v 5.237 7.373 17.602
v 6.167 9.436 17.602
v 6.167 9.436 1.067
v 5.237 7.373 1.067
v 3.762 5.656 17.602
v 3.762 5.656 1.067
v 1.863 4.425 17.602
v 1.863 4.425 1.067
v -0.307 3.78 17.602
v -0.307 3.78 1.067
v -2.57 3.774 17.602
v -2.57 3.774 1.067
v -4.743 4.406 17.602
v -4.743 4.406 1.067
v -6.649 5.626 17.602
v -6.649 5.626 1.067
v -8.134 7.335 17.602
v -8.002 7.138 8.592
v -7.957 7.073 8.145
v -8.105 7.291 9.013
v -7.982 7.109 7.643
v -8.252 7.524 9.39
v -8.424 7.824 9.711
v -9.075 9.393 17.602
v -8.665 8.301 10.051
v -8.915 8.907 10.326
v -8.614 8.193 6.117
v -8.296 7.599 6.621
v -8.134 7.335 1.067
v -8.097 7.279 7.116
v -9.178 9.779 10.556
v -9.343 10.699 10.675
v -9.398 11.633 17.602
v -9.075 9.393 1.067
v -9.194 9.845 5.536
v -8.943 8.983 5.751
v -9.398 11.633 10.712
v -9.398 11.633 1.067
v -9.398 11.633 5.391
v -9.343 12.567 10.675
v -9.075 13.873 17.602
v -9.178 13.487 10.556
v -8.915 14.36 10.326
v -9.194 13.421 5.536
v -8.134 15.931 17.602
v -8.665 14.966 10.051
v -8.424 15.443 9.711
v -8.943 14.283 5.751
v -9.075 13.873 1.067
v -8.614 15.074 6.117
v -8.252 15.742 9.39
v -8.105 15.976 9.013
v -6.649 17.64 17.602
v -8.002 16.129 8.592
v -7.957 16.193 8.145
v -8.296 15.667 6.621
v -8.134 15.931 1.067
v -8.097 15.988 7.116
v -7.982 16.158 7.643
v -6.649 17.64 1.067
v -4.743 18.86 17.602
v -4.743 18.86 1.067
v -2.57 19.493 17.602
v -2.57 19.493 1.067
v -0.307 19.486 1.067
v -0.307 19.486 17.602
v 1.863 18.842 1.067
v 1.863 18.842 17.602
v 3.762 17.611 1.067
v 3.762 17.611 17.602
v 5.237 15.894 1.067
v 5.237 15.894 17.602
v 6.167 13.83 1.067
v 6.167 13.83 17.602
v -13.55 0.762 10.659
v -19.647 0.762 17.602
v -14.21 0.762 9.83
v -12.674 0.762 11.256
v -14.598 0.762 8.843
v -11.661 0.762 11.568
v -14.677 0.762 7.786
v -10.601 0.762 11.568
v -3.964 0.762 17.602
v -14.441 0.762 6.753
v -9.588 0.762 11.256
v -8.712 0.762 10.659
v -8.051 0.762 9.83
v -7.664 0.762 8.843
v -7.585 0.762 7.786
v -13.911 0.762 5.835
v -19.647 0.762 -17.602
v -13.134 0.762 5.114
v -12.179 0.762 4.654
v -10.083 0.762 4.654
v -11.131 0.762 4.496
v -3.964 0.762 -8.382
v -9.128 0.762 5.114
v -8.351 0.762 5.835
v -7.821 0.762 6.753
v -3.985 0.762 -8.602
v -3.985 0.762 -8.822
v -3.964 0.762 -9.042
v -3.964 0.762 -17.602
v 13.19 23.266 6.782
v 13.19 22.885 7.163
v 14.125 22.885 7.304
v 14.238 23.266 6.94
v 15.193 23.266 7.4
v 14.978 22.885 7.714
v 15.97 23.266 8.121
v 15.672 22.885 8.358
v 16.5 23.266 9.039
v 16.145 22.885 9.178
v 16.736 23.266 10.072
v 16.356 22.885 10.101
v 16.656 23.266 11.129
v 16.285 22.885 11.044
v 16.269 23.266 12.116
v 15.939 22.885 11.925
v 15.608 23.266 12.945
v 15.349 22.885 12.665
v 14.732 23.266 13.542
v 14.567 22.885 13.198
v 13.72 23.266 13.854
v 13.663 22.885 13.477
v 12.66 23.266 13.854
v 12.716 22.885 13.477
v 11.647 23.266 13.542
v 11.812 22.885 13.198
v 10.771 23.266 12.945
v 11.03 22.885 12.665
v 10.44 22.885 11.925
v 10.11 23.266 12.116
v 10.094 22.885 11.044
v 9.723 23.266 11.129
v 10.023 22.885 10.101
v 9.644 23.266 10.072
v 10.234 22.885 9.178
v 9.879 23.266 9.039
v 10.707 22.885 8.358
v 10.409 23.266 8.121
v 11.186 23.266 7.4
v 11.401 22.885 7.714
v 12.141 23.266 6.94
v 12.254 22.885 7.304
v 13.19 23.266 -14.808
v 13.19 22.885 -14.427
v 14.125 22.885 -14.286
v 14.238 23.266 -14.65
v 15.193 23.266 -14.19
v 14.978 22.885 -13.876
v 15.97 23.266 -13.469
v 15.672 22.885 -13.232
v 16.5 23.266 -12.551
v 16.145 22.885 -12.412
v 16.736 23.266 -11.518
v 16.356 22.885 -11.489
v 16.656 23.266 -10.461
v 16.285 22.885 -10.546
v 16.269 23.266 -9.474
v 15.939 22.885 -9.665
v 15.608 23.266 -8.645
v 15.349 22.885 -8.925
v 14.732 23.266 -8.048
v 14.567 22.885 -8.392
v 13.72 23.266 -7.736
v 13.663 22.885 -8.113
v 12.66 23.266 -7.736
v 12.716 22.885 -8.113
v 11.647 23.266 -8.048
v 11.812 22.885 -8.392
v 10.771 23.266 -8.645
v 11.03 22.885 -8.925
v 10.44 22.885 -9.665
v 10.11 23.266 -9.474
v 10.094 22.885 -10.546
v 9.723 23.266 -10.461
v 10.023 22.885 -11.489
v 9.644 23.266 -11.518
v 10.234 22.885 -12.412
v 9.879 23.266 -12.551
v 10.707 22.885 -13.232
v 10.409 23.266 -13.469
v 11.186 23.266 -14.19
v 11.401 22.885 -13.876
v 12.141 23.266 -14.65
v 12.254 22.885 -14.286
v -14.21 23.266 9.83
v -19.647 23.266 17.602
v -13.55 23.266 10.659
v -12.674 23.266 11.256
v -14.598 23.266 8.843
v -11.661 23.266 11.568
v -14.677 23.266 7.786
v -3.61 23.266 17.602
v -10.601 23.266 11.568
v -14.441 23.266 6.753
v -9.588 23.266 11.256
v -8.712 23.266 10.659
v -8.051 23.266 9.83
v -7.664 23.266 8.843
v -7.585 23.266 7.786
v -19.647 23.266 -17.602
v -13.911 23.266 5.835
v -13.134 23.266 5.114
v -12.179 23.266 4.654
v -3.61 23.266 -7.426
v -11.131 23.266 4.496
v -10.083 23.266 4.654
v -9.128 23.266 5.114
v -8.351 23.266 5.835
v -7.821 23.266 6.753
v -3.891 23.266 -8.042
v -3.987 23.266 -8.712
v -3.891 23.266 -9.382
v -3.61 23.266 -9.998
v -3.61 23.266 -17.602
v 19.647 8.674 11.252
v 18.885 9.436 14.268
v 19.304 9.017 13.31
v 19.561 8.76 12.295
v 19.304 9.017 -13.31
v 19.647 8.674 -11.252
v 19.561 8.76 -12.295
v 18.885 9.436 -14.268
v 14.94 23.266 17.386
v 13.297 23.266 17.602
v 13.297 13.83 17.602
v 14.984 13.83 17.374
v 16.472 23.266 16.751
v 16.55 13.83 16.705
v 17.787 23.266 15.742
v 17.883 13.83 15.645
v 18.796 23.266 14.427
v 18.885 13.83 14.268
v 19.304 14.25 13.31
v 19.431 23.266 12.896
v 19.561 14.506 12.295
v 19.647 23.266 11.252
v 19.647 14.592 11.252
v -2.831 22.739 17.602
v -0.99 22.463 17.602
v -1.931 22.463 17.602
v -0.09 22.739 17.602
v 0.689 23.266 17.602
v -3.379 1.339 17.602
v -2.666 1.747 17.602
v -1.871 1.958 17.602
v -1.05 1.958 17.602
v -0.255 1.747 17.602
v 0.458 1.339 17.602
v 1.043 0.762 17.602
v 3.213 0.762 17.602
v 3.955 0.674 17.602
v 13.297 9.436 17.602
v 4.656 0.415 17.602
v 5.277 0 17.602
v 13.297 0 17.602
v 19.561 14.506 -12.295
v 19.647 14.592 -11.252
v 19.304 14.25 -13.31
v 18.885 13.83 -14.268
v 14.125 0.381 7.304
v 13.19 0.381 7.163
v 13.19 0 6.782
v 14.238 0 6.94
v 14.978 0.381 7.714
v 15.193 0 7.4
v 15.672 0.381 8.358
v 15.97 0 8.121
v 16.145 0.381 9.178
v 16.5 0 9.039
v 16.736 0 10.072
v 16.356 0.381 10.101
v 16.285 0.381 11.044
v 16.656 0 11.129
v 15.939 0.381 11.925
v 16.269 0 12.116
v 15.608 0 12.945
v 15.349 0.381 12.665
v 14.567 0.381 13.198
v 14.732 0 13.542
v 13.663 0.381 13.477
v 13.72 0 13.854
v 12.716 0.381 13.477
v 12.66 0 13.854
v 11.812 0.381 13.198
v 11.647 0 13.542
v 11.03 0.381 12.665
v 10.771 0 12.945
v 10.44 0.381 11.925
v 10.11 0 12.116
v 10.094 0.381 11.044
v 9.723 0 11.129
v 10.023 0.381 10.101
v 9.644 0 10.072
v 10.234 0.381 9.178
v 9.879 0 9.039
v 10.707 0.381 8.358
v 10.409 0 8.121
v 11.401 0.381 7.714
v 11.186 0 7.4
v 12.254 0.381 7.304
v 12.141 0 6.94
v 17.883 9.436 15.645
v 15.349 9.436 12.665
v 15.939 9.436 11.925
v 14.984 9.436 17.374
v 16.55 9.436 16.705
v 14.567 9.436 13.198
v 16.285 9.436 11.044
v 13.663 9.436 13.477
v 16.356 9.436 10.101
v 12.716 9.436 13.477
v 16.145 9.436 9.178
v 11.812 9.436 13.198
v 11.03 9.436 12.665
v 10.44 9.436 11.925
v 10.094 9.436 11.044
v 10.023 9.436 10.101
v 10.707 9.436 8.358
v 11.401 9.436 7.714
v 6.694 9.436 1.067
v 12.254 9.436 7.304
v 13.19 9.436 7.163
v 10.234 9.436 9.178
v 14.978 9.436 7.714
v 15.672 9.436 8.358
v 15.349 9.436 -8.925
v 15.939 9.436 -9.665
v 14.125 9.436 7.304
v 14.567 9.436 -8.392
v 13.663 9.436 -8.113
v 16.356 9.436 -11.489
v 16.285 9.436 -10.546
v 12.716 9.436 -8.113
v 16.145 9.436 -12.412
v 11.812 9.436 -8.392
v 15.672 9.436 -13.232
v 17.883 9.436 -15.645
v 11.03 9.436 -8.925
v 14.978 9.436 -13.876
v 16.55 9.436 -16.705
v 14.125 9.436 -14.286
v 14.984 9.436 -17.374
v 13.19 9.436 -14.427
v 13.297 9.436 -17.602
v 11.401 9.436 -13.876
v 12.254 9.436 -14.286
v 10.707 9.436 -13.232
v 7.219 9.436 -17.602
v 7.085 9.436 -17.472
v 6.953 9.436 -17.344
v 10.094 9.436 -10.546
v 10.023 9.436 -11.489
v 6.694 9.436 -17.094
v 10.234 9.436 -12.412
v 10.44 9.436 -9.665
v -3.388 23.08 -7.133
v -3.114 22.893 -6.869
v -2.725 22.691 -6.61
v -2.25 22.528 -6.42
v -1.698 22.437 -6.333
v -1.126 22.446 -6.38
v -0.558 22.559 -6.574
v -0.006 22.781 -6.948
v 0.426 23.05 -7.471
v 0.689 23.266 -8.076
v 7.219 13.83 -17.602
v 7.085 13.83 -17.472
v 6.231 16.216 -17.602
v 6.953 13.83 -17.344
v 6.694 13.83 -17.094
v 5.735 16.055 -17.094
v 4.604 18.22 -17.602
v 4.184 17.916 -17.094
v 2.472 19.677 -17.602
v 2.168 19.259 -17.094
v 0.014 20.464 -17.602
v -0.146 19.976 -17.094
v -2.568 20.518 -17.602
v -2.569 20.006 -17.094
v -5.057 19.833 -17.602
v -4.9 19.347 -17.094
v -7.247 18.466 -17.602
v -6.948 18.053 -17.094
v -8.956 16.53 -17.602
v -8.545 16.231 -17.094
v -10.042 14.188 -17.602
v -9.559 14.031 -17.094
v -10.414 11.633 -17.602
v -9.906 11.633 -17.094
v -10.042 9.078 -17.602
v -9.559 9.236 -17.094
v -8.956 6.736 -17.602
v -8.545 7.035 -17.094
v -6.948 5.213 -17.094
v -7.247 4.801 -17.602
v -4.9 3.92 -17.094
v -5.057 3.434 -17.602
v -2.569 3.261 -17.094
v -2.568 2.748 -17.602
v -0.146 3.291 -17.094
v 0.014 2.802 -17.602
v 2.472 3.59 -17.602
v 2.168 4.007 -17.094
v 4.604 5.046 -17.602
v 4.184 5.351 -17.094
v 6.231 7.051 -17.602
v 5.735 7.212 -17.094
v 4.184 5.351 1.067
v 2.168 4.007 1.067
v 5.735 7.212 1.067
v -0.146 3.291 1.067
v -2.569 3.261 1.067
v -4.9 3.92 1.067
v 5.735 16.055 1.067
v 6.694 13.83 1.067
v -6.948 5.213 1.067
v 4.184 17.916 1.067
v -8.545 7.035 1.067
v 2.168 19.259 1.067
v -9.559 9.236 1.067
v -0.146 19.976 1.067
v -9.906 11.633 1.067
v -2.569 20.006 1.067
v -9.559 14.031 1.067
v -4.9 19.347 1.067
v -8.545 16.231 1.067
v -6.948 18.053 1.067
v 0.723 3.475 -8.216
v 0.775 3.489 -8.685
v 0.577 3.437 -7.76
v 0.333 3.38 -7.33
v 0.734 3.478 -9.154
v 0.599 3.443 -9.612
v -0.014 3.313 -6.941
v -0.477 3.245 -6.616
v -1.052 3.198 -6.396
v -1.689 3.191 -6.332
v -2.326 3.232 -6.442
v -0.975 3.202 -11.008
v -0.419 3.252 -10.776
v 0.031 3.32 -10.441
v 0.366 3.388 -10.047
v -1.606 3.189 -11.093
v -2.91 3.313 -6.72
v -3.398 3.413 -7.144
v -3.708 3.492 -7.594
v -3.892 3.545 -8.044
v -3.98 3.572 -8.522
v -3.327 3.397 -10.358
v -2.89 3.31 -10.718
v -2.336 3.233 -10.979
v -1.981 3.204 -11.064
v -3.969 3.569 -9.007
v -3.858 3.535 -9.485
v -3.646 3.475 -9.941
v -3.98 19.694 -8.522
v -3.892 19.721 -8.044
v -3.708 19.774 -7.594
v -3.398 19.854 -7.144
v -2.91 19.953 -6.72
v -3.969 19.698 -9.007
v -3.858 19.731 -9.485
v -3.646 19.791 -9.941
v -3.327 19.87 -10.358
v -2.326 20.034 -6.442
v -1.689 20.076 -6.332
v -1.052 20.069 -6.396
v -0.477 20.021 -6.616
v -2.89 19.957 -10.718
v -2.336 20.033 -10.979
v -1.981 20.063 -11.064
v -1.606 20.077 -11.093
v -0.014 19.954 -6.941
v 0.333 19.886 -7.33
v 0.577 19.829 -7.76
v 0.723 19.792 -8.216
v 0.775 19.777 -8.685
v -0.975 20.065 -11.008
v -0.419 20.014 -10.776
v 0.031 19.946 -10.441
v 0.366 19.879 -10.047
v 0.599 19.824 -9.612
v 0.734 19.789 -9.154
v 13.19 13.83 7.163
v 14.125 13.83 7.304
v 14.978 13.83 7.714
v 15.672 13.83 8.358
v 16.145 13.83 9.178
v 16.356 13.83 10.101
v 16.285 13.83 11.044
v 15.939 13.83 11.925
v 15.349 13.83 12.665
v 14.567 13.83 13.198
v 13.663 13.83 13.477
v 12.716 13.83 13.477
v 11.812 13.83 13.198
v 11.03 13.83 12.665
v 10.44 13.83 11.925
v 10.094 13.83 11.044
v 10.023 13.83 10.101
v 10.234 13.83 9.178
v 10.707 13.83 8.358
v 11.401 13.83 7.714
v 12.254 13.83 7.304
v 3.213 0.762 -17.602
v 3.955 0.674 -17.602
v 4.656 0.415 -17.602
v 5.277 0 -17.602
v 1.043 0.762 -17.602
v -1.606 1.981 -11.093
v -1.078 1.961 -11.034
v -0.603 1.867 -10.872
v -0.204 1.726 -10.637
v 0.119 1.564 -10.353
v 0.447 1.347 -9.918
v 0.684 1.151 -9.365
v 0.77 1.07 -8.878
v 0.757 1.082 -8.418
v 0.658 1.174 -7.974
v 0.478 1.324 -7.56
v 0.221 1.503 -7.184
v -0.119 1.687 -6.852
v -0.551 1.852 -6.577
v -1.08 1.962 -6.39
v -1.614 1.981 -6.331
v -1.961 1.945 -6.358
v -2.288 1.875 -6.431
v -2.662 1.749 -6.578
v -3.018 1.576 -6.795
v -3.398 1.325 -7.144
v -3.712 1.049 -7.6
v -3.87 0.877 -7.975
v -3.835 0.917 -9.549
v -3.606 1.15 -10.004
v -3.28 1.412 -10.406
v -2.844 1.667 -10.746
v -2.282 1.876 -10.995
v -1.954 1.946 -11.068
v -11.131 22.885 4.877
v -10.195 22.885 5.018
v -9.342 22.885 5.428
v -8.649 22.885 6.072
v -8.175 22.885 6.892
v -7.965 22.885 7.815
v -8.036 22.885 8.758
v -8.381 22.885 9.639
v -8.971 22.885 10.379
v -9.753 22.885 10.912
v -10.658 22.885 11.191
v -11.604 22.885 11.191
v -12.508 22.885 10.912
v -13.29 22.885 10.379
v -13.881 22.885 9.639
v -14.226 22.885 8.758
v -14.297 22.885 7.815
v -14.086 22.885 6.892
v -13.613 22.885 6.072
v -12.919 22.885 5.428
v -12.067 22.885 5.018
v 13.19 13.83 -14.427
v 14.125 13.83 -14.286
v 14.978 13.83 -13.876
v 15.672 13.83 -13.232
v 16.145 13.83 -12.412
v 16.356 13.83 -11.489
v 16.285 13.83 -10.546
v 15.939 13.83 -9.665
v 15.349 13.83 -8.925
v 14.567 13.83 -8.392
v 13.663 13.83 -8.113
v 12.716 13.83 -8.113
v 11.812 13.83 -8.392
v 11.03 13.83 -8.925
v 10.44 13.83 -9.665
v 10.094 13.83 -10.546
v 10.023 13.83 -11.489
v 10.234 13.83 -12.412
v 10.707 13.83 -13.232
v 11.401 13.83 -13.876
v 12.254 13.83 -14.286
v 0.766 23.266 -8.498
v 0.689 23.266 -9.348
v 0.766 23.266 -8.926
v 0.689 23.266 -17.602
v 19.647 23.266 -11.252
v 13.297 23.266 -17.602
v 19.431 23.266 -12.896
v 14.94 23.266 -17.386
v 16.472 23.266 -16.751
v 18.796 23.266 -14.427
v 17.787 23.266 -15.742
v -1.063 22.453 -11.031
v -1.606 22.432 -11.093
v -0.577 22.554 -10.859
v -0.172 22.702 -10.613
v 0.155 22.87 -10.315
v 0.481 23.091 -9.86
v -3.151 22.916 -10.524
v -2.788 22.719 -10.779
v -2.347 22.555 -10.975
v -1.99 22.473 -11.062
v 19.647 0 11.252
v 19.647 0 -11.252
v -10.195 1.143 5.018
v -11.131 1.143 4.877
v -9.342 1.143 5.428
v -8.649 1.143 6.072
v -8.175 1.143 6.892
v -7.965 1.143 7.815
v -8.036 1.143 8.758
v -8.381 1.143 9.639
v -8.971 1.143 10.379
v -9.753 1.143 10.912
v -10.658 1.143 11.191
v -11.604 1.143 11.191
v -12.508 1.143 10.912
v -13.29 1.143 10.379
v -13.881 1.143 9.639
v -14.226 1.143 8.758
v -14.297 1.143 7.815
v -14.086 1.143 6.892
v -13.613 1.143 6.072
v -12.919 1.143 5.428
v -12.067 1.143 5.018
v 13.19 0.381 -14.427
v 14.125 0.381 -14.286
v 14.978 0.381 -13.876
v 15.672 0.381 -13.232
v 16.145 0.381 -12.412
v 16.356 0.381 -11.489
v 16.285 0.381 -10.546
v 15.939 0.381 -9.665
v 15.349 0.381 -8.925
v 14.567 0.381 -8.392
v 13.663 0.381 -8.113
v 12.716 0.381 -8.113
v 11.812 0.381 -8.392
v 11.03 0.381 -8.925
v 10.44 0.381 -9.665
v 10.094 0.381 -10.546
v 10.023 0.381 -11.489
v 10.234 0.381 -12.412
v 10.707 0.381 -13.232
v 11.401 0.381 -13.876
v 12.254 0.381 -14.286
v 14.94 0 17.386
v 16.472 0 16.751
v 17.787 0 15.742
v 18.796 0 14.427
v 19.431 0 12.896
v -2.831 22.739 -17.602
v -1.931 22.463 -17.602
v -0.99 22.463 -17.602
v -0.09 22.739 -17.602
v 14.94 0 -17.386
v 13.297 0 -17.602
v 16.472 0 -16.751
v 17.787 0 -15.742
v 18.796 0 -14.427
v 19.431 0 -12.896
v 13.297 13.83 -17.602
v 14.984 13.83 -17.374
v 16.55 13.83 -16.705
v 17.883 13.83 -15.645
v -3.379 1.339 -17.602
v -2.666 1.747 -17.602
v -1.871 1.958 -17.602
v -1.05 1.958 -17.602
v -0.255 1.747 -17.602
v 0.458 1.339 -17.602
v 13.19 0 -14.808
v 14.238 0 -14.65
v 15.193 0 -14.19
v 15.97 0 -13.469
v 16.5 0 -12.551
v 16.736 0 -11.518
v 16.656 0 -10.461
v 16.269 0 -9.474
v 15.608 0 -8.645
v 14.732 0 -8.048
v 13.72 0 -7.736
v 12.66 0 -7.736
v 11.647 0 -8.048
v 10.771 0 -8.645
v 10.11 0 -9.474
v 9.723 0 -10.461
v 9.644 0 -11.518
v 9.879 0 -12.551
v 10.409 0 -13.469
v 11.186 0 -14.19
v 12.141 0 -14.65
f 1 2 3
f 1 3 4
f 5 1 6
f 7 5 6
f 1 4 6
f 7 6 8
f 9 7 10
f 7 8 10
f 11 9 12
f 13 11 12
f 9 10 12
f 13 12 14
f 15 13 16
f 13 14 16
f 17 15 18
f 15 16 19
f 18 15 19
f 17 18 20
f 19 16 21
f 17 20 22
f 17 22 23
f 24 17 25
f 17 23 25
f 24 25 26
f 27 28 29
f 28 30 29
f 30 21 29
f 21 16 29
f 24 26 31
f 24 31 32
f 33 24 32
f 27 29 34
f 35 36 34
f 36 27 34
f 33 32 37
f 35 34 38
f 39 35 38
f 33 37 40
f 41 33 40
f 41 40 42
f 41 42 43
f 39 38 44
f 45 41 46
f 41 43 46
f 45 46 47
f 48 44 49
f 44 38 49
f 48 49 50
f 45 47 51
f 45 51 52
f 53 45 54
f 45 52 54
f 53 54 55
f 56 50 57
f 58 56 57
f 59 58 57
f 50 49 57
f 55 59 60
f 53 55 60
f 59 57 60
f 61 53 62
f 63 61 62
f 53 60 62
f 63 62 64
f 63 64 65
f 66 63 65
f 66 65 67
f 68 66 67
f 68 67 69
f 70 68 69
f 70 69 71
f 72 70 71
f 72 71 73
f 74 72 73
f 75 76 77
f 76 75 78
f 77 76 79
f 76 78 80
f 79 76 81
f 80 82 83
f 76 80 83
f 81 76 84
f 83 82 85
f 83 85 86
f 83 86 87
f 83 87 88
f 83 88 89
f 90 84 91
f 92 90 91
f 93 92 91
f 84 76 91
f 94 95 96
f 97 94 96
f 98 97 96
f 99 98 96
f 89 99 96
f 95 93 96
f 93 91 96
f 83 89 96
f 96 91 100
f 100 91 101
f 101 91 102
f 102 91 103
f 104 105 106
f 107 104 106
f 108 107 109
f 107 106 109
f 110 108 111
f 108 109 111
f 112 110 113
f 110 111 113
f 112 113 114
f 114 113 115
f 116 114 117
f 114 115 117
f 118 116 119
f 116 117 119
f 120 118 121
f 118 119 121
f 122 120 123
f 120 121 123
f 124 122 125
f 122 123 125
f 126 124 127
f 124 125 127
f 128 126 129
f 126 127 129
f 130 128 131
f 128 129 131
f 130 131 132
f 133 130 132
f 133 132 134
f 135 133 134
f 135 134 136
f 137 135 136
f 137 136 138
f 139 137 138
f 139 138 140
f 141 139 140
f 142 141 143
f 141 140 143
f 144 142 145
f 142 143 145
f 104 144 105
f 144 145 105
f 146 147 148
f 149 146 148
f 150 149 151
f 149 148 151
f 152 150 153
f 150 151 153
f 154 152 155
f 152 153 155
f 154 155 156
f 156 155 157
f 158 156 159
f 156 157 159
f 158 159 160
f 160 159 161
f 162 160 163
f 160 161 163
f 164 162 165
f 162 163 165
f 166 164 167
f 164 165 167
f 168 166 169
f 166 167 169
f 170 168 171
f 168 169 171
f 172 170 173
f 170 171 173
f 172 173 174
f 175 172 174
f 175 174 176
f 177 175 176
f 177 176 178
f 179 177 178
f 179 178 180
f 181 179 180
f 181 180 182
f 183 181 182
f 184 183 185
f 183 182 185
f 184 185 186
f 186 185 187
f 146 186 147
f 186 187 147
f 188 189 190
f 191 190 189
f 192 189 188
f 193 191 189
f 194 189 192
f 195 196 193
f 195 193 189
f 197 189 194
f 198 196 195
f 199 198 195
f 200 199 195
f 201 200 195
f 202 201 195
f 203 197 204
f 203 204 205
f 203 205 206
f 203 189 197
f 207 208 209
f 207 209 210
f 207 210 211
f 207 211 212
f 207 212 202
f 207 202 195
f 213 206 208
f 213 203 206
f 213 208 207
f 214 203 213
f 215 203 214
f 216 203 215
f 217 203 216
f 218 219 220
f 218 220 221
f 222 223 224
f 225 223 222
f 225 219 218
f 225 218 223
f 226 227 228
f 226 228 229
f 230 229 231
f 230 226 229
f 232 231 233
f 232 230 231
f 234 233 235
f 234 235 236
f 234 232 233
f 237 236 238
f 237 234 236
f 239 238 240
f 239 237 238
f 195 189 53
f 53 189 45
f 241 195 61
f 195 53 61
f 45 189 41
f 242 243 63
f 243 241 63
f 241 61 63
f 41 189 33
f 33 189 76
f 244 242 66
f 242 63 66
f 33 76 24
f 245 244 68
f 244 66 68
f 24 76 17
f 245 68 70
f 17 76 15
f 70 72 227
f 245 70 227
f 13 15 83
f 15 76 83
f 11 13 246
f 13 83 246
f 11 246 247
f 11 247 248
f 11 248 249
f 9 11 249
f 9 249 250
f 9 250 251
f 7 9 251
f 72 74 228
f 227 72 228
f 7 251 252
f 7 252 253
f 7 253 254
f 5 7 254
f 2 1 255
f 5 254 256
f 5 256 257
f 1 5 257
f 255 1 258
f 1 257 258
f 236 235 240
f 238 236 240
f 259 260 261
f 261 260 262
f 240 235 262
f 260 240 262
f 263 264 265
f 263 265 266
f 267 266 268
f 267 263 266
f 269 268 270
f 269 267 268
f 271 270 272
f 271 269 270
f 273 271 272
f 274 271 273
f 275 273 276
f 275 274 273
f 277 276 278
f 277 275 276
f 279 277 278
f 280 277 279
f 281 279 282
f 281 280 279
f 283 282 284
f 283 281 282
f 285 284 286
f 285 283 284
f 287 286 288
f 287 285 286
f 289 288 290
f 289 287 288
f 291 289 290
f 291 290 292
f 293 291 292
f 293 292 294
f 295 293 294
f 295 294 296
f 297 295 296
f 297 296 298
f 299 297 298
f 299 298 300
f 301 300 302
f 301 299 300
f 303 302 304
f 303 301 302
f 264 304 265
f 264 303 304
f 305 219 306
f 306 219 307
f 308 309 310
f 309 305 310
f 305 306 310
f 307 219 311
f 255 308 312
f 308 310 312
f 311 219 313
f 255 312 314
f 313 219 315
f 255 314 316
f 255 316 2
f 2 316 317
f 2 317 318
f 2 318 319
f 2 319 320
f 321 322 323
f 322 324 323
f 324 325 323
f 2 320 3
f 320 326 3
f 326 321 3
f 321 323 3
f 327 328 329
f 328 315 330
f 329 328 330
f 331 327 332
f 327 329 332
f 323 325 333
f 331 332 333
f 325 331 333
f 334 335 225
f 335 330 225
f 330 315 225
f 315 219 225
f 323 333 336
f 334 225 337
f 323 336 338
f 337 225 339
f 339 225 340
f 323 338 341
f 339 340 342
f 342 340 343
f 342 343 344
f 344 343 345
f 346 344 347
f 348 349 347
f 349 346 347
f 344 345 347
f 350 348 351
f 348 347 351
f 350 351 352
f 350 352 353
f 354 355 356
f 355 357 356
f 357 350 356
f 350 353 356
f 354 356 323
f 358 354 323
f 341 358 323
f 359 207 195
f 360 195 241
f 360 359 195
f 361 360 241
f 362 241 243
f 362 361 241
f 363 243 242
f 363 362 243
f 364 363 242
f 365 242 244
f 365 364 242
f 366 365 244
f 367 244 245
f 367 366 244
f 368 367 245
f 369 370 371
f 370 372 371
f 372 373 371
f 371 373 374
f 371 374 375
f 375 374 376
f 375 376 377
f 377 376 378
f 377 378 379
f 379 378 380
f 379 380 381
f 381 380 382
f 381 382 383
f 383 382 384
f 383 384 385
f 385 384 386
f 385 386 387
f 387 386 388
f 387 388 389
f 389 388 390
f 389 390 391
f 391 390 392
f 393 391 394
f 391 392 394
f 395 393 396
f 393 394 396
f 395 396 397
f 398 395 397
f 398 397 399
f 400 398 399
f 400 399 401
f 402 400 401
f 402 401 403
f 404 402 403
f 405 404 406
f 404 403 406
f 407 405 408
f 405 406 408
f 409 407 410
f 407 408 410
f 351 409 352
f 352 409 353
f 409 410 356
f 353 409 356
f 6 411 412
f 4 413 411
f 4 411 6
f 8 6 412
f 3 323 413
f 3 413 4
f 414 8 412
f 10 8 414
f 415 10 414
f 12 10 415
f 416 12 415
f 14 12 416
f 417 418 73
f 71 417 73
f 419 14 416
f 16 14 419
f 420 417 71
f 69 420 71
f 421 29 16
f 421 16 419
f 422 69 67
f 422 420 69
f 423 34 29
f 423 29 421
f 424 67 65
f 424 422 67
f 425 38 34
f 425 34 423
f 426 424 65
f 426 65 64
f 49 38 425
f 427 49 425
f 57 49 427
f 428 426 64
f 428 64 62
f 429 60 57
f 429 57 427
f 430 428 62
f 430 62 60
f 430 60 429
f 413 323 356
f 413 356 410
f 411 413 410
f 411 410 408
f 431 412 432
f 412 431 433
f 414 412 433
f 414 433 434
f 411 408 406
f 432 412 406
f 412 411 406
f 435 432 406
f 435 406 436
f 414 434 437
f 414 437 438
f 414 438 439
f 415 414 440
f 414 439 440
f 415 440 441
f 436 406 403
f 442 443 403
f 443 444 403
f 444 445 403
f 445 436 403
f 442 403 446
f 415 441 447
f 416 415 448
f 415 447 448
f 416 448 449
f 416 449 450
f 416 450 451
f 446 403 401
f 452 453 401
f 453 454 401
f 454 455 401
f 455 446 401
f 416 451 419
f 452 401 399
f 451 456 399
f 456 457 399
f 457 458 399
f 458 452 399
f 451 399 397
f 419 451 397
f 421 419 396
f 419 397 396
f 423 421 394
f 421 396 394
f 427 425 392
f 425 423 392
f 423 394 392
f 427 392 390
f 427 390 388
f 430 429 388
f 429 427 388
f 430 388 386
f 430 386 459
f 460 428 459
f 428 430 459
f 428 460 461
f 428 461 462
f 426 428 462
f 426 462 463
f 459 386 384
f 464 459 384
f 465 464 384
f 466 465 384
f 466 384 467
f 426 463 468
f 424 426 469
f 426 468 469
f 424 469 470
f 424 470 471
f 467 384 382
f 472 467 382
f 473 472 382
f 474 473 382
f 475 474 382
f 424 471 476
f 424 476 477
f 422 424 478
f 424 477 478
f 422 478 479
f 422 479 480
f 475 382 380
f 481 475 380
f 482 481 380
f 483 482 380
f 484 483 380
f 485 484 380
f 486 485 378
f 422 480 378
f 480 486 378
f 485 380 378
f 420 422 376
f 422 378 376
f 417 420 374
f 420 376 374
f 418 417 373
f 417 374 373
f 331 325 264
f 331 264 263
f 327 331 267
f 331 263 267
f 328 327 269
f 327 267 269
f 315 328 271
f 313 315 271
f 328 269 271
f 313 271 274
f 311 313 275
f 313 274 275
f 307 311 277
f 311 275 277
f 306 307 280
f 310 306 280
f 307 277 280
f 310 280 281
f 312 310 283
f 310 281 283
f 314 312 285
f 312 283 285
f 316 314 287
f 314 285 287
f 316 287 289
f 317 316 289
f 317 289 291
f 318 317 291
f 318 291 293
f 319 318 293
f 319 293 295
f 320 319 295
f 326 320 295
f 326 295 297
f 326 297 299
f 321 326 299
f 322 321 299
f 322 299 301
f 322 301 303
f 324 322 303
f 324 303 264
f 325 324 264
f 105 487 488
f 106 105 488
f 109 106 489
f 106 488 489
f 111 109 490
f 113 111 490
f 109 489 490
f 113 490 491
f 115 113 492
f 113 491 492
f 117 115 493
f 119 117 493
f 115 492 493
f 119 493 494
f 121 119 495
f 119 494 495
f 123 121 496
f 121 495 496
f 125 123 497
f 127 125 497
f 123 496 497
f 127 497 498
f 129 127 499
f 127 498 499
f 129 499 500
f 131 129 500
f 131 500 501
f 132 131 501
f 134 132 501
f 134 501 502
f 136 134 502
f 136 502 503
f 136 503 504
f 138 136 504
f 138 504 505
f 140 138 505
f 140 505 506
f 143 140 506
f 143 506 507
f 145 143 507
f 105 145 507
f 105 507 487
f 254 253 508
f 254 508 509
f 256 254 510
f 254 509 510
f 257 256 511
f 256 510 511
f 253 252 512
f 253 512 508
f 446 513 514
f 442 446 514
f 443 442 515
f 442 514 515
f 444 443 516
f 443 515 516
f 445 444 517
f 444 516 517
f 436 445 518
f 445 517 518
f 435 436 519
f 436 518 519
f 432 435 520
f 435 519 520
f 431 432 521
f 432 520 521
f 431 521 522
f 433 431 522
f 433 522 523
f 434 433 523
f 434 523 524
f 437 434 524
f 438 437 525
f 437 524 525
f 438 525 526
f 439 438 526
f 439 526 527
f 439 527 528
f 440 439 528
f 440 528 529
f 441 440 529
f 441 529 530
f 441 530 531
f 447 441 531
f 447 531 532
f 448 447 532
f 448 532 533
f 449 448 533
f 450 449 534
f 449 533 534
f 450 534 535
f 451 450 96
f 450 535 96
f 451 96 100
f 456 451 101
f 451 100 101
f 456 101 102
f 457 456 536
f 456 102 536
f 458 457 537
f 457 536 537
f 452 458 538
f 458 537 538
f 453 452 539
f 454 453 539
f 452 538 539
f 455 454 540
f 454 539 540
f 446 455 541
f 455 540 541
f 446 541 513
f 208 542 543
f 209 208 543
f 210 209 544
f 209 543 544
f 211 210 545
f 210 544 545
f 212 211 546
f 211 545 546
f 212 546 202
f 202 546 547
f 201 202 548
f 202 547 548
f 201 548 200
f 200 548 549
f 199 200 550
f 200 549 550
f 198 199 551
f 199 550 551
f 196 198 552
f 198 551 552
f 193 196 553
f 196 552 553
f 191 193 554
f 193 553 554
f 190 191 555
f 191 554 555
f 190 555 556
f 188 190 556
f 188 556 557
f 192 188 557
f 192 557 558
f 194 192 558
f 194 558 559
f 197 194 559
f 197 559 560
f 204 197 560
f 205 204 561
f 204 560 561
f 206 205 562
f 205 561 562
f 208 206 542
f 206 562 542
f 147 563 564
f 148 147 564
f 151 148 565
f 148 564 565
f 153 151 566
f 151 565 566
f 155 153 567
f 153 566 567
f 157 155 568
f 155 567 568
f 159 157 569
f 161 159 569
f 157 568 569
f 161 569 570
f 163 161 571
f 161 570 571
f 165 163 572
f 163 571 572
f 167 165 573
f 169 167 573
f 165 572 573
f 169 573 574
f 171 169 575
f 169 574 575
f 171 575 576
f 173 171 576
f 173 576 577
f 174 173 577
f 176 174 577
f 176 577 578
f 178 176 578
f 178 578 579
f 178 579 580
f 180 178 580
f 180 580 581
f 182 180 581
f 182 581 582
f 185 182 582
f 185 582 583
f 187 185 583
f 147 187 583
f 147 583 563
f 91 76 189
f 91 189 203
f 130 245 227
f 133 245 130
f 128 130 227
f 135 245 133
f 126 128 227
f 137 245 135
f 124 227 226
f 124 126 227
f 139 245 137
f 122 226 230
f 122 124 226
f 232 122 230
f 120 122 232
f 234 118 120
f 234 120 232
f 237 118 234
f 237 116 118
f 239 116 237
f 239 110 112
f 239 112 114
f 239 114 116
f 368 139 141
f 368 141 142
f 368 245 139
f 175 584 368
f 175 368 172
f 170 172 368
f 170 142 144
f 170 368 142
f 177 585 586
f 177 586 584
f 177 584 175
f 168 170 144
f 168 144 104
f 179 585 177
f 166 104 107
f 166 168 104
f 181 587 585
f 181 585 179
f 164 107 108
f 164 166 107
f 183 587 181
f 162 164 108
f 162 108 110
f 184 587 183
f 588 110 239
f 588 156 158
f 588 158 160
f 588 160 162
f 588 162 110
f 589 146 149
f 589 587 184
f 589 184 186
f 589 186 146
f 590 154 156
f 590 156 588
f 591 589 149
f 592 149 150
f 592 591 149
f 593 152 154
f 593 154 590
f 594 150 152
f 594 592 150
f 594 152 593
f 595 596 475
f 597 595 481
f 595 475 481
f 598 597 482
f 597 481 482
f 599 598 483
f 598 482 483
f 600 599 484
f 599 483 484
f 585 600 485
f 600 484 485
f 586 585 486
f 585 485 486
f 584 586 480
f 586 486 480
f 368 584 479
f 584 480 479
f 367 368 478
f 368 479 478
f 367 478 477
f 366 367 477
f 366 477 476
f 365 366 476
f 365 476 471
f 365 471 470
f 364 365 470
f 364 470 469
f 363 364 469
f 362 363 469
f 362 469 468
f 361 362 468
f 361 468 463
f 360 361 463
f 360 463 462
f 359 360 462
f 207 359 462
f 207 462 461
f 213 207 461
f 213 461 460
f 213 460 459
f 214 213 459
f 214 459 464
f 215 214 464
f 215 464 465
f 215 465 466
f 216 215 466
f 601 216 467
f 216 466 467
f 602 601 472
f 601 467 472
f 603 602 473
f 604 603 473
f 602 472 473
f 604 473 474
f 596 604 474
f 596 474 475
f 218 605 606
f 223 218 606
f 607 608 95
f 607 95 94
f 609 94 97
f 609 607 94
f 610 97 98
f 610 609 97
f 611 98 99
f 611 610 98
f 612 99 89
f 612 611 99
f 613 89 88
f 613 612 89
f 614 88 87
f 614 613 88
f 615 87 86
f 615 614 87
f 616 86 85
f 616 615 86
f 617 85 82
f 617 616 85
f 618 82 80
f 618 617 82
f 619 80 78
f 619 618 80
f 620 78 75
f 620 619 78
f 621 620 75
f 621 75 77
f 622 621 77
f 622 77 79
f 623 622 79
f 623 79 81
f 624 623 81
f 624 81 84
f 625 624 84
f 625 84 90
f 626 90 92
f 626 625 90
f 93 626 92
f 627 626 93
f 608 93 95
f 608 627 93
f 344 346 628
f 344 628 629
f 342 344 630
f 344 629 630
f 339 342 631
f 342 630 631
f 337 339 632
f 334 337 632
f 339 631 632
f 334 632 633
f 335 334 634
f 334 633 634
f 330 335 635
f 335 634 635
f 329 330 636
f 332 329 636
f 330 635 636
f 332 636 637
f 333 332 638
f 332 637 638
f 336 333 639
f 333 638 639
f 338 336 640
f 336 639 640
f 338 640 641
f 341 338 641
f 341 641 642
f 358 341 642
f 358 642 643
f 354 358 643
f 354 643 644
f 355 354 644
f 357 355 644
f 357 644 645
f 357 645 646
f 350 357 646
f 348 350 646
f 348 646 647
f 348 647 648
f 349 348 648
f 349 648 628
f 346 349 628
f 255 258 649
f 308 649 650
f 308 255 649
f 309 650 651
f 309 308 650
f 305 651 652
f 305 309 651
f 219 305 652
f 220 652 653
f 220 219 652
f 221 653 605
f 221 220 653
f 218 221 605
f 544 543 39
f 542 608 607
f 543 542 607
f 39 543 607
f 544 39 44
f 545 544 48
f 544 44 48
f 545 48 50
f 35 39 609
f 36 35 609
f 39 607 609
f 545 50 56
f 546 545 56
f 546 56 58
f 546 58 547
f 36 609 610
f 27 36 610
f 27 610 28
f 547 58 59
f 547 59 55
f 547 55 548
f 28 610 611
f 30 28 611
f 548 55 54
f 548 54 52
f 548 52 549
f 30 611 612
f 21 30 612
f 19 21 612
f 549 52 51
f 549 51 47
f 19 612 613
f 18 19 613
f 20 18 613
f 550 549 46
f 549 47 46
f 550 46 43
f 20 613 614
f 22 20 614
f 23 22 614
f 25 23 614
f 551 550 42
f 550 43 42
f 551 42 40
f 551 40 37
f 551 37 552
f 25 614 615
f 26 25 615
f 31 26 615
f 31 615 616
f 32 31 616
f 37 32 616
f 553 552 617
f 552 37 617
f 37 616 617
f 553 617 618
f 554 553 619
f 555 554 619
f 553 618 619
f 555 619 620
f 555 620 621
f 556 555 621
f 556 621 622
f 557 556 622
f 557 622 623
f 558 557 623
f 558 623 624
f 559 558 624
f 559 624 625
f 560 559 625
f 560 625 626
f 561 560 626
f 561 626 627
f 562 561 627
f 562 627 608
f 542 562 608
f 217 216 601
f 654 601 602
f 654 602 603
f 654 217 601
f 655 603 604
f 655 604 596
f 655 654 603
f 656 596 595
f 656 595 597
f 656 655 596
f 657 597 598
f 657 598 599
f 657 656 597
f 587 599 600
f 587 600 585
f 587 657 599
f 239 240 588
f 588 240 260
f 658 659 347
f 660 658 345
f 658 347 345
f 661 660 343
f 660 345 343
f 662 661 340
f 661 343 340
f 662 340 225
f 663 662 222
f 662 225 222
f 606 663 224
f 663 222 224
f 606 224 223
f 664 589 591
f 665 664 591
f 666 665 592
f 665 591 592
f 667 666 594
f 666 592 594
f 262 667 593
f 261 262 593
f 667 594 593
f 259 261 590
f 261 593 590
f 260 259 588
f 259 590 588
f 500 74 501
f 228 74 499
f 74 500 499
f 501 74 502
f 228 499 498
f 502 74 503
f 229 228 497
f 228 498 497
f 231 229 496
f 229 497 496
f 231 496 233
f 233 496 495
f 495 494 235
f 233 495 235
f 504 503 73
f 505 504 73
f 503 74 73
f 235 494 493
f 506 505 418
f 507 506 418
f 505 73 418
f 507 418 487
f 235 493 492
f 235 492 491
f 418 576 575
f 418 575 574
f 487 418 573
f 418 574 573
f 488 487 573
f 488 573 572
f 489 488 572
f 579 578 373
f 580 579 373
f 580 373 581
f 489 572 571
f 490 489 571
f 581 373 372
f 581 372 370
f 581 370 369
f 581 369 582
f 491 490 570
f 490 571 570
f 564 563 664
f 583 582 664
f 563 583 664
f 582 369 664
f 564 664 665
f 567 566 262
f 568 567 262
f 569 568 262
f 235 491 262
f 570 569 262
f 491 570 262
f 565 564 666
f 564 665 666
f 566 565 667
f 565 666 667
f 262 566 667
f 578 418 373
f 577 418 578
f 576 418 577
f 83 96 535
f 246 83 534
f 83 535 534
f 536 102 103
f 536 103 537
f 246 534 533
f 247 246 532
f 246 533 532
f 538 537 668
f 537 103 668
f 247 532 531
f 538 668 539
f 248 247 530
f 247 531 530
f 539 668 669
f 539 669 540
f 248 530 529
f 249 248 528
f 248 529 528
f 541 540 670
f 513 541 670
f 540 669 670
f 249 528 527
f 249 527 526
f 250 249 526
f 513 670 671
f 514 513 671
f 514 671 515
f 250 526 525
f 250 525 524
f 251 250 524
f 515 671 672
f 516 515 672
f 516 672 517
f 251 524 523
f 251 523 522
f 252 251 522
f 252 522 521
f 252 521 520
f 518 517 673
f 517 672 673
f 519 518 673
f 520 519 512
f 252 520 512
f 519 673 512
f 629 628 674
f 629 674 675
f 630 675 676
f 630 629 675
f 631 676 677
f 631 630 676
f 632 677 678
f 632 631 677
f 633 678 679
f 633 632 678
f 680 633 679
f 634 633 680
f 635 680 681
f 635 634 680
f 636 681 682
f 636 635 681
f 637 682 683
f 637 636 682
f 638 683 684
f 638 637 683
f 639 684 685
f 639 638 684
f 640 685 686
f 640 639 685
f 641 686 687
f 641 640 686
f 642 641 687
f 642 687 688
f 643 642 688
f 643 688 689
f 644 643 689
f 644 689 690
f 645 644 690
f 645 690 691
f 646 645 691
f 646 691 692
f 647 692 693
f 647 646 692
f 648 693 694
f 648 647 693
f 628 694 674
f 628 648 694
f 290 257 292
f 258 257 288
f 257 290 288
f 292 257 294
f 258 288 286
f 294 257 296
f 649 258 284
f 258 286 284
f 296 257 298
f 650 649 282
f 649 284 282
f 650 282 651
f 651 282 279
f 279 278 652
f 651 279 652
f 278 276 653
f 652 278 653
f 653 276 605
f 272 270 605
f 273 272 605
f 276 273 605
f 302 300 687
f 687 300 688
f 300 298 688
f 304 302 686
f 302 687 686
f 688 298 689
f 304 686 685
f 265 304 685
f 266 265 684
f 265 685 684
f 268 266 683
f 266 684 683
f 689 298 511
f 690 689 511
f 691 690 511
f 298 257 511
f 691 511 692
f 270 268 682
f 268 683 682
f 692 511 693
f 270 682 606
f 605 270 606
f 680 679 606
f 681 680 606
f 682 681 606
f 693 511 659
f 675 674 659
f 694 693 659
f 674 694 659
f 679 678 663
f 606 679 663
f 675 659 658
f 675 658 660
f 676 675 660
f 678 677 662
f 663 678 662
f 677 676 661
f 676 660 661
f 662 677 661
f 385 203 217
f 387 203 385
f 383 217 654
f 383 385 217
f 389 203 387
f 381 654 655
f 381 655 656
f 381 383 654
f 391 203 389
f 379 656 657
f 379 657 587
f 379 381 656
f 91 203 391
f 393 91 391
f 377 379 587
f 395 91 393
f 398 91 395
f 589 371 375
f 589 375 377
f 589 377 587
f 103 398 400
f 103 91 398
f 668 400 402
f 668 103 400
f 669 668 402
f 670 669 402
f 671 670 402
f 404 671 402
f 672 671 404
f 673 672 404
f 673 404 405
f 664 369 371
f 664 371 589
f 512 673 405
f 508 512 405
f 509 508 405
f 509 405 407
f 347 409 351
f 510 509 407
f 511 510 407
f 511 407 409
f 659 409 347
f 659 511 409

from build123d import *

# Parameters (mm, degrees)
SKETCH1_W               = 39.2938
SKETCH1_H               = 35.2044
BOSS_EXTRUDE1_DEPTH     = 23.2664
CUT_EXTRUDE1_DEPTH      = 47.54756522
SKETCH3_R               = 8.4455
CUT_EXTRUDE2_DEPTH      = 18.669
SKETCH4_R               = 3.175
SKETCH4_R_2             = 2.38125
CUT_EXTRUDE3_DEPTH      = 36.173334977
CUT_EXTRUDE4_DEPTH      = 47.547565346
CUT_EXTRUDE5_DEPTH      = 47.547565346
FILLET1_R               = 6.35
CHAMFER1_SIZE           = 0.508
CHAMFER2_SIZE           = 0.381
CUT_EXTRUDE6_DEPTH      = 36.173335093
CUT_EXTRUDE6_DEPTH_BACK = 36.173335093


with BuildPart() as part:
    # Sketch1 → Boss-Extrude1 (new body)
    with BuildSketch(Plane(origin=(0, 0, 0), x_dir=(1, 0, 0), z_dir=(0, 1, 0))):
        Rectangle(SKETCH1_W, SKETCH1_H)
    extrude(amount=BOSS_EXTRUDE1_DEPTH)

    # Sketch2 → Cut-Extrude1 (cut, through all)
    with BuildSketch(Plane(origin=(0, 0, -17.6022), x_dir=(-1, 0, 0), z_dir=(0, 0, -1))):
        with BuildLine():
            Line((-6.477, 11.6332), (-19.6469, 11.6332))
            Line((-19.6469, 11.6332), (-19.6469, 9.4361))
            Line((-19.6469, 9.4361), (-6.166862443, 9.4361))
            ThreePointArc((-6.166862443, 9.4361), (-6.399083184, 10.523759407), (-6.477, 11.6332))
        make_face()
        with BuildLine():
            Line((-19.6469, 13.8303), (-19.6469, 11.6332))
            Line((-19.6469, 11.6332), (-6.477, 11.6332))
            ThreePointArc((-6.477, 11.6332), (-6.399083184, 12.742640593), (-6.166862443, 13.8303))
            Line((-6.166862443, 13.8303), (-19.6469, 13.8303))
        make_face()
        with BuildLine():
            ThreePointArc((-6.166862443, 13.8303), (-6.399083184, 12.742640593), (-6.477, 11.6332))
            Line((-6.477, 11.6332), (9.398, 11.6332))
            ThreePointArc((9.398, 11.6332), (2.569940593, 19.492783184), (-6.166862443, 13.8303))
        make_face()
        with BuildLine():
            Line((9.398, 11.6332), (-6.477, 11.6332))
            ThreePointArc((-6.477, 11.6332), (-6.399083184, 10.523759407), (-6.166862443, 9.4361))
            ThreePointArc((-6.166862443, 9.4361), (2.569940593, 3.773616816), (9.398, 11.6332))
        make_face()
    extrude(amount=-CUT_EXTRUDE1_DEPTH, mode=Mode.SUBTRACT)

    # Sketch3 → Cut-Extrude2 (cut)
    with BuildSketch(Plane(origin=(0, 0, -17.6022), x_dir=(-1, 0, 0), z_dir=(0, 0, -1))):
        with Locations((1.4605, 11.6332)):
            Circle(SKETCH3_R)
    extrude(amount=-CUT_EXTRUDE2_DEPTH, mode=Mode.SUBTRACT)

    # Sketch4 → Cut-Extrude3 (cut, through all)
    with BuildSketch(Plane.XZ):
        with Locations(Location((13.189602751, -11.2522, 0), (0, 0, 270))):
            Circle(SKETCH4_R)
        with Locations(Location((13.189602751, 10.3378, 0), (0, 0, 270))):
            Circle(SKETCH4_R)
        with Locations(Location((-1.605897249, -8.7122, 0), (0, 0, 270))):
            Circle(SKETCH4_R_2)
        with Locations(Location((-11.130897249, 8.0518, 0), (0, 0, 270))):
            Circle(SKETCH4_R)
    extrude(amount=-CUT_EXTRUDE3_DEPTH, mode=Mode.SUBTRACT)

    # Sketch5 → Cut-Extrude4 (cut, through all)
    with BuildSketch(Plane(origin=(0, 0, -17.6022), x_dir=(-1, 0, 0), z_dir=(0, 0, -1))):
        with BuildLine():
            Line((-0.688916377, 23.2664), (3.609916377, 23.2664))
            ThreePointArc((3.609916377, 23.2664), (1.4605, 22.4282), (-0.688916377, 23.2664))
        make_face()
    extrude(amount=-CUT_EXTRUDE4_DEPTH, mode=Mode.SUBTRACT)

    # Sketch7 → Cut-Extrude5 (cut, through all)
    with BuildSketch(Plane(origin=(0, 0, -17.6022), x_dir=(-1, 0, 0), z_dir=(0, 0, -1))):
        with BuildLine():
            Line((-1.043201365, 0.762), (3.964201365, 0.762))
            ThreePointArc((3.964201365, 0.762), (1.4605, 1.984538867), (-1.043201365, 0.762))
        make_face()
        with BuildLine():
            Line((19.6469, 0), (19.6469, 0.762))
            Line((19.6469, 0.762), (3.964201365, 0.762))
            Line((3.964201365, 0.762), (-1.043201365, 0.762))
            Line((-1.043201365, 0.762), (-3.2131, 0.762))
            ThreePointArc((-3.2131, 0.762), (-4.312952263, 0.565414007), (-5.276605755, 0))
            Line((-5.276605755, 0), (19.6469, 0))
        make_face()
    extrude(amount=-CUT_EXTRUDE5_DEPTH, mode=Mode.SUBTRACT)

    # Fillet1
    fillet1_edges = [part.edges().sort_by_distance(p)[0] for p in [
        (19.6469, 4.71805, -17.6022),
        (19.6469, 4.71805, 17.6022),
        (19.6469, 18.54835, -17.6022),
        (19.6469, 18.54835, 17.6022),
    ]]
    fillet(fillet1_edges, radius=FILLET1_R)

    # Chamfer1
    chamfer1_edges = [part.edges().sort_by_distance(p)[0] for p in [
        (-9.906, 11.6332, -17.6022),
    ]]
    chamfer(chamfer1_edges, length=CHAMFER1_SIZE)

    # Chamfer2
    chamfer2_edges = [part.edges().sort_by_distance(p)[0] for p in [
        (-11.130897249, 0.762, 11.2268),
        (-11.130897249, 23.2664, 11.2268),
        (13.189602751, 23.2664, 13.5128),
        (13.189602751, 0, 13.5128),
        (13.189602751, 23.2664, -8.0772),
        (13.189602751, 0, -8.0772),
    ]]
    chamfer(chamfer2_edges, length=CHAMFER2_SIZE)

    # Sketch8 → Cut-Extrude6 (cut, two sides: drawn at the far end of the back side and taken through both)
    with BuildSketch(Plane.XY.offset(-CUT_EXTRUDE6_DEPTH_BACK)):
        Polygon((18.8849, 13.8303), (19.6469, 14.5923), (19.6469, 13.8303), align=None)
        Polygon((18.8849, 9.4361), (19.6469, 8.6741), (19.6469, 9.4361), align=None)
    extrude(amount=CUT_EXTRUDE6_DEPTH + CUT_EXTRUDE6_DEPTH_BACK, mode=Mode.SUBTRACT)


solid = part.part
